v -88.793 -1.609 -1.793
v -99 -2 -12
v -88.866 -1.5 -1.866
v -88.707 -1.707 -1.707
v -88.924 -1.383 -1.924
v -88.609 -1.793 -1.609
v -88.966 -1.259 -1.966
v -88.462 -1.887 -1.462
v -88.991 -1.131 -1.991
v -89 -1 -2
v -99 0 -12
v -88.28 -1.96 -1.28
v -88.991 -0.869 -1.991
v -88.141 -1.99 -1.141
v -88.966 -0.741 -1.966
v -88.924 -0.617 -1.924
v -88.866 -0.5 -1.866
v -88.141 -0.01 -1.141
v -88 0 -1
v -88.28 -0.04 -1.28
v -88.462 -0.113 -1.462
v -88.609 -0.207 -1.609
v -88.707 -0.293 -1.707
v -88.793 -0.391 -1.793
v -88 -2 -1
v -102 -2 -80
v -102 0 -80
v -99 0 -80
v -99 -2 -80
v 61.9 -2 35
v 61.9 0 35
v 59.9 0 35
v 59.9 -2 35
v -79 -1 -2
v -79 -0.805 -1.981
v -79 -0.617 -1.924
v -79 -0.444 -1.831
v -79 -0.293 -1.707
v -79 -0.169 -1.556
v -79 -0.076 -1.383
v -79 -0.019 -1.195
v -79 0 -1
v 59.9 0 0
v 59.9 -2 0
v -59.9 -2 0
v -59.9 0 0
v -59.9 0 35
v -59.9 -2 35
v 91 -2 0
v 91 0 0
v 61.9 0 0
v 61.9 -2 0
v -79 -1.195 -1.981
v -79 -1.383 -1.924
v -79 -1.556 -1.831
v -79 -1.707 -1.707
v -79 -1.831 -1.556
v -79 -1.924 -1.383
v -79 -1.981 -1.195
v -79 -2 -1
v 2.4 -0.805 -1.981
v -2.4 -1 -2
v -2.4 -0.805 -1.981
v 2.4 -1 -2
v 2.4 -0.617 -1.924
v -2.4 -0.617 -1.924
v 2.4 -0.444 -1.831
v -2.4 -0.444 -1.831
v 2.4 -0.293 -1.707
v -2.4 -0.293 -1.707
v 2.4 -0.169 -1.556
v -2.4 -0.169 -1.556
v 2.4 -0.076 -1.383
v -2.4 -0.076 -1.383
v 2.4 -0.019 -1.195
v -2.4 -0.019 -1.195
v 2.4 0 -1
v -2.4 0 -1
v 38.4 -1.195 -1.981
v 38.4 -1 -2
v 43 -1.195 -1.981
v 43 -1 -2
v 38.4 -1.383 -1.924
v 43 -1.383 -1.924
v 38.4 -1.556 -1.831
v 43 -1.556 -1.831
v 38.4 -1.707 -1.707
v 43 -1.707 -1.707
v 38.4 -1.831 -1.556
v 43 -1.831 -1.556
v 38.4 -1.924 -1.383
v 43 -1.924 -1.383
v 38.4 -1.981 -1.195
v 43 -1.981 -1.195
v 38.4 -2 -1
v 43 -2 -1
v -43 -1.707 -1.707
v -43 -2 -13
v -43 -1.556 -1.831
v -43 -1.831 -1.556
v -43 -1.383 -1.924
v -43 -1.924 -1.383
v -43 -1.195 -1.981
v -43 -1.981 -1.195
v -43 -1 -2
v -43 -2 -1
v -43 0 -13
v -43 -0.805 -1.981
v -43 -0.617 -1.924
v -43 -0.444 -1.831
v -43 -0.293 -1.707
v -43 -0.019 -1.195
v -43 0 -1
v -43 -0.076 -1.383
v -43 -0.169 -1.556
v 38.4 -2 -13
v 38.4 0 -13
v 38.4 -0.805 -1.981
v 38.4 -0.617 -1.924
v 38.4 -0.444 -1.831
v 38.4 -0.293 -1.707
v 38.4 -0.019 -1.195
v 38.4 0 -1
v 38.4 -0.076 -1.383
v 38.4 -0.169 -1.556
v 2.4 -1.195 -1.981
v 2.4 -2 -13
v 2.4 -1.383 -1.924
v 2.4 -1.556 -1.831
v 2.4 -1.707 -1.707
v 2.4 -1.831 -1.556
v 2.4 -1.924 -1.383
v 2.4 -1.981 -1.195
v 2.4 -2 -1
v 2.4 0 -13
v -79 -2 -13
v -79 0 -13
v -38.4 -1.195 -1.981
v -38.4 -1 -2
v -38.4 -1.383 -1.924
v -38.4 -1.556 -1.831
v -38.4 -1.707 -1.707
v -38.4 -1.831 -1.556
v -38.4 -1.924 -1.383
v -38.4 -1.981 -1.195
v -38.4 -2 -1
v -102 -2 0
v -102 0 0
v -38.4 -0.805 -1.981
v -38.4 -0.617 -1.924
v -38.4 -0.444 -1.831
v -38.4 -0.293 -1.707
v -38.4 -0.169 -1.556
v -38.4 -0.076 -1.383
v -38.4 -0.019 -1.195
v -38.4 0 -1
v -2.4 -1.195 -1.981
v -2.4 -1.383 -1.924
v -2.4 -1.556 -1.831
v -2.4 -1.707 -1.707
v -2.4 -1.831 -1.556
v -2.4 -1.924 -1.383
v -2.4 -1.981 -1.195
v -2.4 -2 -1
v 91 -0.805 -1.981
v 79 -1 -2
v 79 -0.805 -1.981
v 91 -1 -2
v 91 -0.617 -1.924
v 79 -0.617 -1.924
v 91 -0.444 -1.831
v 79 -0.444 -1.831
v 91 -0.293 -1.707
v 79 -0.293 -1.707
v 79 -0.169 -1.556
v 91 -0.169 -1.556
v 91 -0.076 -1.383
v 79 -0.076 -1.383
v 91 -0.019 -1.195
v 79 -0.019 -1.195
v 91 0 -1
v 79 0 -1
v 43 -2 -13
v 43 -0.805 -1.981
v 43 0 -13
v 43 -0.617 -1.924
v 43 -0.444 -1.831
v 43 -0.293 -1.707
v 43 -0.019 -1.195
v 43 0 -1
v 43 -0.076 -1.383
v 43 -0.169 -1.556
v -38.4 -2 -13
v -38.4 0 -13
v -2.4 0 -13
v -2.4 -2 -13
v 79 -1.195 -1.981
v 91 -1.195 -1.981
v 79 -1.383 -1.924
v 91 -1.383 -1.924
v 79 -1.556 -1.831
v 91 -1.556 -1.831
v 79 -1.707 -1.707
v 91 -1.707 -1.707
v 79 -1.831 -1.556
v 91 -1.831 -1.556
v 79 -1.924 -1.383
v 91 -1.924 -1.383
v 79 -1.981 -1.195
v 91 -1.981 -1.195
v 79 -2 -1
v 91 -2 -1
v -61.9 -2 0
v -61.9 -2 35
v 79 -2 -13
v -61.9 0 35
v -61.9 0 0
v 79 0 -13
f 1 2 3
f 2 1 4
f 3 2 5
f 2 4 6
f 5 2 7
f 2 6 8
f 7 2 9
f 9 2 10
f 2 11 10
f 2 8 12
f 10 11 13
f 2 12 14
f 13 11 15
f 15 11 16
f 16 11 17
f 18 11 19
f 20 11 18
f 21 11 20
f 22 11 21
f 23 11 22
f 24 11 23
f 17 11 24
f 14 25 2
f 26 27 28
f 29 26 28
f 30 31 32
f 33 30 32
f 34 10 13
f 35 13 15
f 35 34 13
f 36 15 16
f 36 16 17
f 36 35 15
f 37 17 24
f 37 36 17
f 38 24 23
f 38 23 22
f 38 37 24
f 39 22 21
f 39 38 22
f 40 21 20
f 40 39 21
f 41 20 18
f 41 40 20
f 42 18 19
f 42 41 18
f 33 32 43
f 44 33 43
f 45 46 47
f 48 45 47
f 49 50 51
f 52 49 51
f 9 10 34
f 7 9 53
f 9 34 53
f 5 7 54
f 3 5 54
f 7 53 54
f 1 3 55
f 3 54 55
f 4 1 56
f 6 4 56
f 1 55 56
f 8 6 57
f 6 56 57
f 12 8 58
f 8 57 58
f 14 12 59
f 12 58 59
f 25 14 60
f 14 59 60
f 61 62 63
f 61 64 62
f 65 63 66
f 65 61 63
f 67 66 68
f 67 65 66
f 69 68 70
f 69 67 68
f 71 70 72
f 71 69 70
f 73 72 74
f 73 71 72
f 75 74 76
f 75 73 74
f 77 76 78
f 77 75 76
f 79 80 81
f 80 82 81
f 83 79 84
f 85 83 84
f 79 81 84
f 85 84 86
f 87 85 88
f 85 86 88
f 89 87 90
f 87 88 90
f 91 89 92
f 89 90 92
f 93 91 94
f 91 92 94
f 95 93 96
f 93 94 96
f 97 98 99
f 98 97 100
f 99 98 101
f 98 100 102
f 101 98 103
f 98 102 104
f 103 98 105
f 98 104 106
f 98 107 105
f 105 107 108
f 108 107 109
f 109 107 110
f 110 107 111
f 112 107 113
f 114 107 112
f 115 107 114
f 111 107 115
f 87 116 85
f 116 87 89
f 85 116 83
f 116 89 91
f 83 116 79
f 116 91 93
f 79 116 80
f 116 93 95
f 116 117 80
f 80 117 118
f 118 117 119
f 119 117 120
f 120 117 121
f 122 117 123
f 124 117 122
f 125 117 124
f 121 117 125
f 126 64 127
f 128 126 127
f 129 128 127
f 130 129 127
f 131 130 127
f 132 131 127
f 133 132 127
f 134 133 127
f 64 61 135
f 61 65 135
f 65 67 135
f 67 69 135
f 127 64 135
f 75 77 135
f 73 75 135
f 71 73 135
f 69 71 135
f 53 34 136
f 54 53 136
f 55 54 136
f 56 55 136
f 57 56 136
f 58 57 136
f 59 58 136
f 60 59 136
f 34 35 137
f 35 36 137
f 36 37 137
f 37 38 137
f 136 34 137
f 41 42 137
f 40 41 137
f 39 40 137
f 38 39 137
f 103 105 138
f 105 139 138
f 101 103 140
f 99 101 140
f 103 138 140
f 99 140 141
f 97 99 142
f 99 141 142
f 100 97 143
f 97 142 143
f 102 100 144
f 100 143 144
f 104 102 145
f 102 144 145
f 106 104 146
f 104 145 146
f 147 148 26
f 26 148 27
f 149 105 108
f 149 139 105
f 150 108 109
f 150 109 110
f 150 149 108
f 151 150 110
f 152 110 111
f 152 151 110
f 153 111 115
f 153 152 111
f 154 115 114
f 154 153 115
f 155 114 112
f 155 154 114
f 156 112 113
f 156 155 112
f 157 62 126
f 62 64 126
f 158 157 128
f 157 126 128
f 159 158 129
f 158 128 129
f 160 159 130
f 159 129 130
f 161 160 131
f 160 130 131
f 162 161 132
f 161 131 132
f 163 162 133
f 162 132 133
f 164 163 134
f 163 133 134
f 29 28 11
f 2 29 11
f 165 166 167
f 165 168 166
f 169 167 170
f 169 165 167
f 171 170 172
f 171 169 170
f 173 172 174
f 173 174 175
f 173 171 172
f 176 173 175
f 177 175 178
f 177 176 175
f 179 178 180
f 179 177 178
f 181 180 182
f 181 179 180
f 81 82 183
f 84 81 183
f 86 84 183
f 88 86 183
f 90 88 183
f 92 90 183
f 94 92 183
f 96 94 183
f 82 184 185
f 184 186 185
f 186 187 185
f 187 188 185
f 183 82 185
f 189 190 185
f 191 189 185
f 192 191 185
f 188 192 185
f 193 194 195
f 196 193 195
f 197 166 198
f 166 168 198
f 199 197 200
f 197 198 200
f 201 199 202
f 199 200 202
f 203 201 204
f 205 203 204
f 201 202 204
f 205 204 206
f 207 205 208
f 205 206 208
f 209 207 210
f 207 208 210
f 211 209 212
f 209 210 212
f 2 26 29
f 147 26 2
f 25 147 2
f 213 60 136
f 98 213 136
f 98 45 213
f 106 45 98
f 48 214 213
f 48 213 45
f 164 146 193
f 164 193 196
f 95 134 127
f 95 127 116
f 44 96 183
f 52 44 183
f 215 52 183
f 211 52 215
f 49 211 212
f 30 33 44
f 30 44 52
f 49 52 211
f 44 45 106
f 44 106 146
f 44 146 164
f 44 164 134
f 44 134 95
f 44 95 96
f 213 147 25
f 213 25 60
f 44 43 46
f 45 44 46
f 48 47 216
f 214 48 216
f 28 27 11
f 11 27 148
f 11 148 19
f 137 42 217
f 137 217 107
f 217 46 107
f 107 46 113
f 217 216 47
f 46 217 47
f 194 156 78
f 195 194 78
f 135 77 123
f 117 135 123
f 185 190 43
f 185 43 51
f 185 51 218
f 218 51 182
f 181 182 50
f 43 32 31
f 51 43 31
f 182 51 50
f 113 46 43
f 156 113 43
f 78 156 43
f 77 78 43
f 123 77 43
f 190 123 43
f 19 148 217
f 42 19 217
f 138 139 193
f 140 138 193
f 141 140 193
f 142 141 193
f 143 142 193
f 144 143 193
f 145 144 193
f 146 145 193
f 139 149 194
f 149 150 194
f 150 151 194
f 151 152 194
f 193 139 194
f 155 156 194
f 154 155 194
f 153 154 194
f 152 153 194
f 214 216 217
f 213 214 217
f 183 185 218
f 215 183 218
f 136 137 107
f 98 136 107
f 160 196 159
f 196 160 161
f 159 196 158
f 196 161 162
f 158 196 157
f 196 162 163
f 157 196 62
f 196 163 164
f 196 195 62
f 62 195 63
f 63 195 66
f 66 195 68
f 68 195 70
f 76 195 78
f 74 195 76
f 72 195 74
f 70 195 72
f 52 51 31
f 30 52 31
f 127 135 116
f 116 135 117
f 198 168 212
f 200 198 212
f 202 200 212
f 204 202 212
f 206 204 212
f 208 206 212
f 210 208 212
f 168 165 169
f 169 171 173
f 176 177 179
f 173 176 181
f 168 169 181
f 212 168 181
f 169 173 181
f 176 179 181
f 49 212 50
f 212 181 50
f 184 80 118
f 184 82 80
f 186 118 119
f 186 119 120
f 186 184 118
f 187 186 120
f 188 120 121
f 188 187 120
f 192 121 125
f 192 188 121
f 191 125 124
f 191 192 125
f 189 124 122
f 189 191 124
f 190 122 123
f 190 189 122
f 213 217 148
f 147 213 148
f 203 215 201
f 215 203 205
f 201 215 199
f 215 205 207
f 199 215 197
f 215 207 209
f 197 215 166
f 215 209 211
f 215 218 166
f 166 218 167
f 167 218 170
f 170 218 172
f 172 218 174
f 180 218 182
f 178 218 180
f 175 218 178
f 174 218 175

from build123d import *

# Parameters (mm, degrees)
F1_DEPTH = 2
F2_R     = 0.99999
F3_R     = 0.99999


# Not quite as in the source:
# - a fillet or chamfer is up to 0.001 mm smaller than in the source, because OpenCascade refuses the exact size


with BuildPart() as f1:
    # F0 (on Front) → F1 (new body)
    with BuildSketch(Plane.XZ):
        Polygon((59.9, 0), (0, 0), (-59.9, 0), (-59.9, 35), (-61.9, 35), (-61.9, 0), (-79, 0), (-100, 0), (-102, 0), (-102, -80), (-99, -80), (-99, -12), (-89, -2), (-79, -2), (-79, -13), (-43, -13), (-43, -2), (-38.4, -2), (-38.4, -13), (-2.4, -13), (-2.4, -2), (0, -2), (2.4, -2), (2.4, -13), (38.4, -13), (38.4, -2), (43, -2), (43, -13), (79, -13), (79, -2), (91, -2), (91, 0), (79, 0), (61.9, 0), (61.9, 35), (59.9, 35), align=None)
    extrude(amount=F1_DEPTH)

    # F2 (radius 1 in the source; OpenCascade refuses exactly that, so slightly less here)
    f2_edges = [f1.edges().sort_by_distance(p)[0] for p in [
        (-84, -2, -2),
        (-84, 0, -2),
        (85, 0, -2),
        (85, -2, -2),
    ]]
    fillet(f2_edges, radius=F2_R)

    # F3 (radius 1 in the source; OpenCascade refuses exactly that, so slightly less here)
    f3_edges = [f1.edges().sort_by_distance(p)[0] for p in [
        (-40.7, -2, -2),
        (0, -2, -2),
        (40.7, -2, -2),
        (-40.7, 0, -2),
        (0, 0, -2),
        (40.7, 0, -2),
    ]]
    fillet(f3_edges, radius=F3_R)


solid = f1.part
